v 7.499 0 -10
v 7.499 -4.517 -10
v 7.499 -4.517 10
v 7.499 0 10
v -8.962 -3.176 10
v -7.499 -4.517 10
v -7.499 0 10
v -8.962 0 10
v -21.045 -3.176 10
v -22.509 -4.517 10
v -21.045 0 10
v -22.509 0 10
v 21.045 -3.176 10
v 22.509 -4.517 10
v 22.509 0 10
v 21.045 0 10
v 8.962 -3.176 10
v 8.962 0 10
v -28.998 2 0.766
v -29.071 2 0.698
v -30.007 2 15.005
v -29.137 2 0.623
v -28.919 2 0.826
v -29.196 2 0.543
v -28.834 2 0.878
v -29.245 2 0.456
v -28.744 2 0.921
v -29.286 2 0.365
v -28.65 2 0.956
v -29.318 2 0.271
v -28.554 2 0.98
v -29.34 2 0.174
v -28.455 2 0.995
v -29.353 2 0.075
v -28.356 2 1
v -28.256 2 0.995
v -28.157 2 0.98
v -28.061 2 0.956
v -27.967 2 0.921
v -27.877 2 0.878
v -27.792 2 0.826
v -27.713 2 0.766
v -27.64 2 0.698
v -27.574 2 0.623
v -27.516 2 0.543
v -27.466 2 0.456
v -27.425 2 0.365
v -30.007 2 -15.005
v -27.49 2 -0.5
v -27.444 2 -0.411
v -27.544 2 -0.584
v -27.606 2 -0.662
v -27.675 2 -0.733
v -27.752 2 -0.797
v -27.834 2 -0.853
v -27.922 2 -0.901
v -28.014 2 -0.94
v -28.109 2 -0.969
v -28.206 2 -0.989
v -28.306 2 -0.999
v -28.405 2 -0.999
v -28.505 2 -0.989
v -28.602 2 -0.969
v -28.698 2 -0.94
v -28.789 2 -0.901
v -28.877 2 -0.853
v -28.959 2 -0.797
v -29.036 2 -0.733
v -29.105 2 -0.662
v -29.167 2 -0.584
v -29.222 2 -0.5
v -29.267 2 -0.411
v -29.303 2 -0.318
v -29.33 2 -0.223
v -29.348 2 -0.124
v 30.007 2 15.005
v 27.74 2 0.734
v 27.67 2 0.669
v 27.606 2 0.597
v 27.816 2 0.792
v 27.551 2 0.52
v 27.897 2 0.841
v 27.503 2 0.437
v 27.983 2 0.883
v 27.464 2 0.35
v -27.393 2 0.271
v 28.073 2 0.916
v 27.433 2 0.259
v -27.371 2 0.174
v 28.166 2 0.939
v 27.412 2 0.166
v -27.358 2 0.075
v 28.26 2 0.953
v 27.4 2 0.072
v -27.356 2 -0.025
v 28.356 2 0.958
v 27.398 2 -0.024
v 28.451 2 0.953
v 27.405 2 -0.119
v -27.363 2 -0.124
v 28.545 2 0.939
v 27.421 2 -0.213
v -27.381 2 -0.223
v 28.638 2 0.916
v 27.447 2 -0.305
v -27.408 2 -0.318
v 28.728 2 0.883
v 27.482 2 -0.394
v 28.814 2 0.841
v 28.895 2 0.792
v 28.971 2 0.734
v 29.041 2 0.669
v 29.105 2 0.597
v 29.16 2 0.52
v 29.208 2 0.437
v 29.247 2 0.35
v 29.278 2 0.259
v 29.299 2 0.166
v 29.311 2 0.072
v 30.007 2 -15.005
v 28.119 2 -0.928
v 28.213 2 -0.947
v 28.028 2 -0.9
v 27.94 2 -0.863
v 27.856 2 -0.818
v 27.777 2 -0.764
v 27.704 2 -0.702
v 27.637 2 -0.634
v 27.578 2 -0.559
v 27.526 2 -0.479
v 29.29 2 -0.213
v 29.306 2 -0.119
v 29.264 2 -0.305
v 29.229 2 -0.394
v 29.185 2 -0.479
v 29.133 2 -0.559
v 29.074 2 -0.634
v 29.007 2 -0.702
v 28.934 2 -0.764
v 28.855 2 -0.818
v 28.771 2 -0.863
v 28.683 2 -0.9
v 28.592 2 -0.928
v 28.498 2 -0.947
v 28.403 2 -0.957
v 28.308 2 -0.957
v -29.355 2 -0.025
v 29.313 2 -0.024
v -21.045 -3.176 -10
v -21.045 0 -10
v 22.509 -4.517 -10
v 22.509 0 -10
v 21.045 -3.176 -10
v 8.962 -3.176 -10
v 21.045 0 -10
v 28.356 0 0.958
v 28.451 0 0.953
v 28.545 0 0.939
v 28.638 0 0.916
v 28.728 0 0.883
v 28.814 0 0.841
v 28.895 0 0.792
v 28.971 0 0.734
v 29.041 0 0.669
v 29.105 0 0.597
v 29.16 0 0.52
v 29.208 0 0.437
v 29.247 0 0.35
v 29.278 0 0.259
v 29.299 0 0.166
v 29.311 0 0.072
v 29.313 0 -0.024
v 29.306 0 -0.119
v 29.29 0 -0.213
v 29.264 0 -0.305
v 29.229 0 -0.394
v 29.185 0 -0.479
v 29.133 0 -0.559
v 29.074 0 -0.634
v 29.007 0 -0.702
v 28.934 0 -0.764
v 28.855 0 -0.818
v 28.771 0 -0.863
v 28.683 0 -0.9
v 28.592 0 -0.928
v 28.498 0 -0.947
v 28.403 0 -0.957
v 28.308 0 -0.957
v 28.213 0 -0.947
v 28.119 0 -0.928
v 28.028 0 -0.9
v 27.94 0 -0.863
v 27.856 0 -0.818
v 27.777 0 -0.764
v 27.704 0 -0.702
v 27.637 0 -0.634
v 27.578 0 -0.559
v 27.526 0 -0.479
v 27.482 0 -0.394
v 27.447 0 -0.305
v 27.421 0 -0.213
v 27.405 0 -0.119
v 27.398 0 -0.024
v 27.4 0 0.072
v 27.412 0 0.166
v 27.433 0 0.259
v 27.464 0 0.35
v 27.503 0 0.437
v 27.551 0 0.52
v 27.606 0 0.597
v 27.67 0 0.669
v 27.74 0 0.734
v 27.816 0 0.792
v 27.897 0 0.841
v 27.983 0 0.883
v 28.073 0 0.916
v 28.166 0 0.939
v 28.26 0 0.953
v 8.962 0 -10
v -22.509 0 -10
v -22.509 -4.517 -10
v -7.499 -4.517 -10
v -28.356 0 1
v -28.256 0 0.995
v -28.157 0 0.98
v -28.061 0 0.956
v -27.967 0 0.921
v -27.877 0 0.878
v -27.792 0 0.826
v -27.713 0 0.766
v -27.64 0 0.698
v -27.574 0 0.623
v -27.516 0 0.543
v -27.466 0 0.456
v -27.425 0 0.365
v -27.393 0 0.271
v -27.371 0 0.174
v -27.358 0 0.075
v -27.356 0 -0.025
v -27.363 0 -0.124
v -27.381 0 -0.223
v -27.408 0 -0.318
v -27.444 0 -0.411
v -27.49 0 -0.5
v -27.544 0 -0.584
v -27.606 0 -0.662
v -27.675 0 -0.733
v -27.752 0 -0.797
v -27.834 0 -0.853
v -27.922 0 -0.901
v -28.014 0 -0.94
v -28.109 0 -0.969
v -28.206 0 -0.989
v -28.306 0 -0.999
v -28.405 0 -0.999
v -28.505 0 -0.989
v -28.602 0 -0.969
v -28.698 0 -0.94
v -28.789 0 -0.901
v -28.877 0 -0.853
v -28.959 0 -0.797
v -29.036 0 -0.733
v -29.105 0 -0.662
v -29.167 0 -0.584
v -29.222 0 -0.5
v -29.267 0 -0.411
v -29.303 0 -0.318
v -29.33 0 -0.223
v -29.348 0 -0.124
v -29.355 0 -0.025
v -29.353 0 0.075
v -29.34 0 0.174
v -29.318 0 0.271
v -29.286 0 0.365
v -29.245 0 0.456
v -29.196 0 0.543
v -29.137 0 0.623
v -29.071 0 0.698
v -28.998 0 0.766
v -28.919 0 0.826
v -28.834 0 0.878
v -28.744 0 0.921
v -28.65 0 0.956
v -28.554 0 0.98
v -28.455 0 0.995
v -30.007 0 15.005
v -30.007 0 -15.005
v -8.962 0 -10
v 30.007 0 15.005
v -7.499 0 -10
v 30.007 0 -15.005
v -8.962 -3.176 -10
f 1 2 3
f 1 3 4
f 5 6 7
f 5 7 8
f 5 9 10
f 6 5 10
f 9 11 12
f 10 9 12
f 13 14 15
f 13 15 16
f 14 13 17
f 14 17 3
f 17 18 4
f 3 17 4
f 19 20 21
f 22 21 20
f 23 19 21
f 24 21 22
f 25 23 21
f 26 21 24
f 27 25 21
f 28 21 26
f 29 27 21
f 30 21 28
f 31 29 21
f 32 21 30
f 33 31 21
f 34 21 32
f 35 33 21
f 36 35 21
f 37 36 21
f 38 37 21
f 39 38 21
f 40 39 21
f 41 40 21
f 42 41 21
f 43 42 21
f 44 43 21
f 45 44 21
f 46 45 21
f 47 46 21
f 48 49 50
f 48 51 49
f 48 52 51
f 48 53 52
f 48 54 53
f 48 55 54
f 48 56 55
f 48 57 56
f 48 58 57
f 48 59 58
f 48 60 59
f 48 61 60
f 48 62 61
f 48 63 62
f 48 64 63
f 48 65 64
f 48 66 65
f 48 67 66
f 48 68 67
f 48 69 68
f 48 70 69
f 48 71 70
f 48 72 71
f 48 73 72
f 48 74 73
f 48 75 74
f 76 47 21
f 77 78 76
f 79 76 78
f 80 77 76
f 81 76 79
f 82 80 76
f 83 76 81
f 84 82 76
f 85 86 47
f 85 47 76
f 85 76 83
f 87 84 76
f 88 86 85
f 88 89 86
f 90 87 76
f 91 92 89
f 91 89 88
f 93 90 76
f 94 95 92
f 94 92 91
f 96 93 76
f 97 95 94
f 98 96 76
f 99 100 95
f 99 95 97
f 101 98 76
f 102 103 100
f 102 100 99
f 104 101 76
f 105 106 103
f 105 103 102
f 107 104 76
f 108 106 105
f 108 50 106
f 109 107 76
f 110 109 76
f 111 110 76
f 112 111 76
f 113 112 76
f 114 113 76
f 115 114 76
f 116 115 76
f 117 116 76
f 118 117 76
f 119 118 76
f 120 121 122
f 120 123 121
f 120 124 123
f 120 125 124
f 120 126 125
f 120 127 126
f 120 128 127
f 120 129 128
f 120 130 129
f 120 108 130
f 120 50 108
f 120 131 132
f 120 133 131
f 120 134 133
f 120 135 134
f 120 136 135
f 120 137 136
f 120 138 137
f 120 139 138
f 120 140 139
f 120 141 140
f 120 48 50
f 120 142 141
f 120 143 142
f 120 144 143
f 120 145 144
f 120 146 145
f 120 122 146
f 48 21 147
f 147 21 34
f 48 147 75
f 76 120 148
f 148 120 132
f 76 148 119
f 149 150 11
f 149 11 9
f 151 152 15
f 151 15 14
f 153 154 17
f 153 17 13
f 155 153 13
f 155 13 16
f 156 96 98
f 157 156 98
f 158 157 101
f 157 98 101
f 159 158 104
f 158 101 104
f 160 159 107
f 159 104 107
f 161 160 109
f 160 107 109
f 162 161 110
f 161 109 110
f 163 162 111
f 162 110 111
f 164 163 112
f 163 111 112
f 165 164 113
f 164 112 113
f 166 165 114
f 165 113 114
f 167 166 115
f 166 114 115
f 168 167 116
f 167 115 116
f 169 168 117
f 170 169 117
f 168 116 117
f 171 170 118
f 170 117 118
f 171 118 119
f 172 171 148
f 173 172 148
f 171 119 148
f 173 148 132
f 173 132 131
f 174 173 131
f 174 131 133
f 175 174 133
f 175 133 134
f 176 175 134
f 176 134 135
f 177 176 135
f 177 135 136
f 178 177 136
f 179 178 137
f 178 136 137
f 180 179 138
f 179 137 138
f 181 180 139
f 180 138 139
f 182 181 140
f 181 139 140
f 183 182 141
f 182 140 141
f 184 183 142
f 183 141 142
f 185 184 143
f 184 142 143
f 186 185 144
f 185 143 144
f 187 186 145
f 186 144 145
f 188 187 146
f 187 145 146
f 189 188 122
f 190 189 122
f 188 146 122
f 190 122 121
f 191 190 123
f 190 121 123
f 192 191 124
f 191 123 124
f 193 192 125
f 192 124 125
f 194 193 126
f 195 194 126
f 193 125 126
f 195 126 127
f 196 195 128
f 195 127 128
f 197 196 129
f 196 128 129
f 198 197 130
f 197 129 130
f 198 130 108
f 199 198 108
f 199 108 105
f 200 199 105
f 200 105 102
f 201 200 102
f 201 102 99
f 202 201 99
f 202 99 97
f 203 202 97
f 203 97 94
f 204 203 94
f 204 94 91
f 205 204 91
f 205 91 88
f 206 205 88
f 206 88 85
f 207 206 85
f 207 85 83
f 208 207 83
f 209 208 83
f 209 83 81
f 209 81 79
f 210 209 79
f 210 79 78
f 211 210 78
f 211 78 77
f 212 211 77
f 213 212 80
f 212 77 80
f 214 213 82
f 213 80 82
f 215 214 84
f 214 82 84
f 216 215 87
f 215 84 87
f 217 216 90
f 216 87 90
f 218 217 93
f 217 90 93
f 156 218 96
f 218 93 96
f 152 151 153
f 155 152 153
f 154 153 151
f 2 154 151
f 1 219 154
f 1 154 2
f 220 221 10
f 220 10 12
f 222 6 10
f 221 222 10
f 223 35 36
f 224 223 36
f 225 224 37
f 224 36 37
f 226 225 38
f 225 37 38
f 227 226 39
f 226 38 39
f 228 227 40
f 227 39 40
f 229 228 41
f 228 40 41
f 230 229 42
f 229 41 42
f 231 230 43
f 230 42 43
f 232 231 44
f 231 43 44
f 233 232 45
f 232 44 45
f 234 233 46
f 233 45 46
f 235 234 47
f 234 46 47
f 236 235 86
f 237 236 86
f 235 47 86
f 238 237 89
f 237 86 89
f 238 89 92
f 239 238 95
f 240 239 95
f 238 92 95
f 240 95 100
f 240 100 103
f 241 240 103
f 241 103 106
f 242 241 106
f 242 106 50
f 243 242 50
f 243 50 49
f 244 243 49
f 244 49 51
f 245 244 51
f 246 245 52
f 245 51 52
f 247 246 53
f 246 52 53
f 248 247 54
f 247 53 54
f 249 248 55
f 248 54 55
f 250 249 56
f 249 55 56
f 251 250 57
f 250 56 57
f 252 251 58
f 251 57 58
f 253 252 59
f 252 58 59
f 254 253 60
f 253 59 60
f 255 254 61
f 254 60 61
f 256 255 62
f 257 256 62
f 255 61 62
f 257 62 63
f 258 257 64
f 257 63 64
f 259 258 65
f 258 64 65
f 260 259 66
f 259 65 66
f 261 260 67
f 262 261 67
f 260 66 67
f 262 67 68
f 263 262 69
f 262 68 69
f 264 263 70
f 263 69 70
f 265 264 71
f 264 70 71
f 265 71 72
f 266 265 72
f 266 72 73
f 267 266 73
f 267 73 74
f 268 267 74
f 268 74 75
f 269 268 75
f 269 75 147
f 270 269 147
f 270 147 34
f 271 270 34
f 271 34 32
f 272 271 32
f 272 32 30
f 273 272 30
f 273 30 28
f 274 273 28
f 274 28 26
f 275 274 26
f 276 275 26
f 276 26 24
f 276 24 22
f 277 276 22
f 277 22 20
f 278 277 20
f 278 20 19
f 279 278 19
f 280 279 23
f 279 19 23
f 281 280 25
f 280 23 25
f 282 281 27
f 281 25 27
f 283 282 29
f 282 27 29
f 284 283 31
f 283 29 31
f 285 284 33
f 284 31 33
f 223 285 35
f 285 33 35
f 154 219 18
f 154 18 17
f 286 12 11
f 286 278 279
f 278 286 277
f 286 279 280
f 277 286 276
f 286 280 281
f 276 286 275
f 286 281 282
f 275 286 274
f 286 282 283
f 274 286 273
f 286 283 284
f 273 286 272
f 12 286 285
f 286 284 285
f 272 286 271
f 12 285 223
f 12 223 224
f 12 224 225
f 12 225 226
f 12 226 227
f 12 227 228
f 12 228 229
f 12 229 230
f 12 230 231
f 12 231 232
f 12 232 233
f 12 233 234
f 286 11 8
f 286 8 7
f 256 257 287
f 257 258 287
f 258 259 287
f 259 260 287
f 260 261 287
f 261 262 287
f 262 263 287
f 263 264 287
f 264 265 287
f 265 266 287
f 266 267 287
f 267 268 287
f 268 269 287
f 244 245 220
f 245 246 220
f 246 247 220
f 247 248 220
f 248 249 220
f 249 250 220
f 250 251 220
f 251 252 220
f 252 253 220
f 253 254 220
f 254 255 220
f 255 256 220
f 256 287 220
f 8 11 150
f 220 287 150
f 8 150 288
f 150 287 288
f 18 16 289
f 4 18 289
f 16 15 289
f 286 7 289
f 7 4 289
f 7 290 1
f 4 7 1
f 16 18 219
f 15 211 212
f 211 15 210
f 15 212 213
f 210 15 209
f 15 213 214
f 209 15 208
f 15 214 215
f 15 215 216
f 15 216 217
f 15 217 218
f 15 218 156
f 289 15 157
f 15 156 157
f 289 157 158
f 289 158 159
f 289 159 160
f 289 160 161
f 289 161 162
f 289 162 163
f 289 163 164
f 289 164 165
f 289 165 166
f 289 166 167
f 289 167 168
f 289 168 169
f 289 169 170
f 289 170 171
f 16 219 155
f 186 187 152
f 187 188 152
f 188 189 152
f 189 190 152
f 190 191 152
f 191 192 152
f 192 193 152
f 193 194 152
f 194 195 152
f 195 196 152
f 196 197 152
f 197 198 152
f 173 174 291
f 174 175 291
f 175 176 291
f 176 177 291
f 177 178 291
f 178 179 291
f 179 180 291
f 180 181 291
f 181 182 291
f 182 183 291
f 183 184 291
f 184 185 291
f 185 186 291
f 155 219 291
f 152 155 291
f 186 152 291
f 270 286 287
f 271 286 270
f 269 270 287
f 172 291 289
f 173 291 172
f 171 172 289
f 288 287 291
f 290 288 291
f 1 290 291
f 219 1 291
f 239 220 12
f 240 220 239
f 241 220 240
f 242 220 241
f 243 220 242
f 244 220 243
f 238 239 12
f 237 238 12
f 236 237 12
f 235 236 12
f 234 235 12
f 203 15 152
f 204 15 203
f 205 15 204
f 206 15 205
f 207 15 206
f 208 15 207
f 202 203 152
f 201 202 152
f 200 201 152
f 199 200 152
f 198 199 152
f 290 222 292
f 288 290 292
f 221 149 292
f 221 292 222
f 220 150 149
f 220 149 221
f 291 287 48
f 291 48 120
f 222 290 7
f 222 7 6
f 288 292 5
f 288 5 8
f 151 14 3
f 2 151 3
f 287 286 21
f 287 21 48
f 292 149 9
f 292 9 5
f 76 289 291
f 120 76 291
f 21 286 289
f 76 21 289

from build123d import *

# Parameters (mm, degrees)
SKETCH1_W                = 60.014675034
SKETCH1_H                = 30.010951808
BOSS_EXTRUDE3_DEPTH      = 2
SKETCH5_R                = 0.958101179
SKETCH5_R_2              = 1
CUT_EXTRUDE2_DEPTH       = 2
BOSS_EXTRUDE5_DEPTH      = 10
BOSS_EXTRUDE5_DEPTH_BACK = 10


with BuildPart() as part:
    # Sketch1 → Boss-Extrude3 (new body)
    with BuildSketch(Plane(origin=(0, 0, 0), x_dir=(1, 0, 0), z_dir=(0, 1, 0))):
        Rectangle(SKETCH1_W, SKETCH1_H)
    extrude(amount=BOSS_EXTRUDE3_DEPTH)

    # Sketch5 → Cut-Extrude2 (cut)
    with BuildSketch(Plane(origin=(0, 2, 0), x_dir=(1, 0, 0), z_dir=(0, 1, 0))):
        with Locations(Location((28.355534017, 0, 0), (0, 0, 270))):
            Circle(SKETCH5_R)
        with Locations(Location((-28.355534017, 0, 0), (0, 0, 270))):
            Circle(SKETCH5_R_2)
    extrude(amount=-CUT_EXTRUDE2_DEPTH, mode=Mode.SUBTRACT)

    # Sketch7 → Boss-Extrude5 (add, two sides: drawn at the far end of the back side and taken through both)
    with BuildSketch(Plane.XY.offset(-BOSS_EXTRUDE5_DEPTH_BACK)):
        Polygon((7.498773608, 0), (8.961948947, 0), (8.961948947, -3.176146278), (21.045388571, -3.176146278), (21.045388571, 0), (22.508563909, 0), (22.508563909, -4.517390338), (7.498773608, -4.517390338), align=None)
        Polygon((-7.498773608, 0), (-7.498773608, -4.517390338), (-22.508563909, -4.517390338), (-22.508563909, 0), (-21.045388571, 0), (-21.045388571, -3.176146278), (-8.961948947, -3.176146278), (-8.961948947, 0), align=None)
    extrude(amount=BOSS_EXTRUDE5_DEPTH + BOSS_EXTRUDE5_DEPTH_BACK)


solid = part.part
